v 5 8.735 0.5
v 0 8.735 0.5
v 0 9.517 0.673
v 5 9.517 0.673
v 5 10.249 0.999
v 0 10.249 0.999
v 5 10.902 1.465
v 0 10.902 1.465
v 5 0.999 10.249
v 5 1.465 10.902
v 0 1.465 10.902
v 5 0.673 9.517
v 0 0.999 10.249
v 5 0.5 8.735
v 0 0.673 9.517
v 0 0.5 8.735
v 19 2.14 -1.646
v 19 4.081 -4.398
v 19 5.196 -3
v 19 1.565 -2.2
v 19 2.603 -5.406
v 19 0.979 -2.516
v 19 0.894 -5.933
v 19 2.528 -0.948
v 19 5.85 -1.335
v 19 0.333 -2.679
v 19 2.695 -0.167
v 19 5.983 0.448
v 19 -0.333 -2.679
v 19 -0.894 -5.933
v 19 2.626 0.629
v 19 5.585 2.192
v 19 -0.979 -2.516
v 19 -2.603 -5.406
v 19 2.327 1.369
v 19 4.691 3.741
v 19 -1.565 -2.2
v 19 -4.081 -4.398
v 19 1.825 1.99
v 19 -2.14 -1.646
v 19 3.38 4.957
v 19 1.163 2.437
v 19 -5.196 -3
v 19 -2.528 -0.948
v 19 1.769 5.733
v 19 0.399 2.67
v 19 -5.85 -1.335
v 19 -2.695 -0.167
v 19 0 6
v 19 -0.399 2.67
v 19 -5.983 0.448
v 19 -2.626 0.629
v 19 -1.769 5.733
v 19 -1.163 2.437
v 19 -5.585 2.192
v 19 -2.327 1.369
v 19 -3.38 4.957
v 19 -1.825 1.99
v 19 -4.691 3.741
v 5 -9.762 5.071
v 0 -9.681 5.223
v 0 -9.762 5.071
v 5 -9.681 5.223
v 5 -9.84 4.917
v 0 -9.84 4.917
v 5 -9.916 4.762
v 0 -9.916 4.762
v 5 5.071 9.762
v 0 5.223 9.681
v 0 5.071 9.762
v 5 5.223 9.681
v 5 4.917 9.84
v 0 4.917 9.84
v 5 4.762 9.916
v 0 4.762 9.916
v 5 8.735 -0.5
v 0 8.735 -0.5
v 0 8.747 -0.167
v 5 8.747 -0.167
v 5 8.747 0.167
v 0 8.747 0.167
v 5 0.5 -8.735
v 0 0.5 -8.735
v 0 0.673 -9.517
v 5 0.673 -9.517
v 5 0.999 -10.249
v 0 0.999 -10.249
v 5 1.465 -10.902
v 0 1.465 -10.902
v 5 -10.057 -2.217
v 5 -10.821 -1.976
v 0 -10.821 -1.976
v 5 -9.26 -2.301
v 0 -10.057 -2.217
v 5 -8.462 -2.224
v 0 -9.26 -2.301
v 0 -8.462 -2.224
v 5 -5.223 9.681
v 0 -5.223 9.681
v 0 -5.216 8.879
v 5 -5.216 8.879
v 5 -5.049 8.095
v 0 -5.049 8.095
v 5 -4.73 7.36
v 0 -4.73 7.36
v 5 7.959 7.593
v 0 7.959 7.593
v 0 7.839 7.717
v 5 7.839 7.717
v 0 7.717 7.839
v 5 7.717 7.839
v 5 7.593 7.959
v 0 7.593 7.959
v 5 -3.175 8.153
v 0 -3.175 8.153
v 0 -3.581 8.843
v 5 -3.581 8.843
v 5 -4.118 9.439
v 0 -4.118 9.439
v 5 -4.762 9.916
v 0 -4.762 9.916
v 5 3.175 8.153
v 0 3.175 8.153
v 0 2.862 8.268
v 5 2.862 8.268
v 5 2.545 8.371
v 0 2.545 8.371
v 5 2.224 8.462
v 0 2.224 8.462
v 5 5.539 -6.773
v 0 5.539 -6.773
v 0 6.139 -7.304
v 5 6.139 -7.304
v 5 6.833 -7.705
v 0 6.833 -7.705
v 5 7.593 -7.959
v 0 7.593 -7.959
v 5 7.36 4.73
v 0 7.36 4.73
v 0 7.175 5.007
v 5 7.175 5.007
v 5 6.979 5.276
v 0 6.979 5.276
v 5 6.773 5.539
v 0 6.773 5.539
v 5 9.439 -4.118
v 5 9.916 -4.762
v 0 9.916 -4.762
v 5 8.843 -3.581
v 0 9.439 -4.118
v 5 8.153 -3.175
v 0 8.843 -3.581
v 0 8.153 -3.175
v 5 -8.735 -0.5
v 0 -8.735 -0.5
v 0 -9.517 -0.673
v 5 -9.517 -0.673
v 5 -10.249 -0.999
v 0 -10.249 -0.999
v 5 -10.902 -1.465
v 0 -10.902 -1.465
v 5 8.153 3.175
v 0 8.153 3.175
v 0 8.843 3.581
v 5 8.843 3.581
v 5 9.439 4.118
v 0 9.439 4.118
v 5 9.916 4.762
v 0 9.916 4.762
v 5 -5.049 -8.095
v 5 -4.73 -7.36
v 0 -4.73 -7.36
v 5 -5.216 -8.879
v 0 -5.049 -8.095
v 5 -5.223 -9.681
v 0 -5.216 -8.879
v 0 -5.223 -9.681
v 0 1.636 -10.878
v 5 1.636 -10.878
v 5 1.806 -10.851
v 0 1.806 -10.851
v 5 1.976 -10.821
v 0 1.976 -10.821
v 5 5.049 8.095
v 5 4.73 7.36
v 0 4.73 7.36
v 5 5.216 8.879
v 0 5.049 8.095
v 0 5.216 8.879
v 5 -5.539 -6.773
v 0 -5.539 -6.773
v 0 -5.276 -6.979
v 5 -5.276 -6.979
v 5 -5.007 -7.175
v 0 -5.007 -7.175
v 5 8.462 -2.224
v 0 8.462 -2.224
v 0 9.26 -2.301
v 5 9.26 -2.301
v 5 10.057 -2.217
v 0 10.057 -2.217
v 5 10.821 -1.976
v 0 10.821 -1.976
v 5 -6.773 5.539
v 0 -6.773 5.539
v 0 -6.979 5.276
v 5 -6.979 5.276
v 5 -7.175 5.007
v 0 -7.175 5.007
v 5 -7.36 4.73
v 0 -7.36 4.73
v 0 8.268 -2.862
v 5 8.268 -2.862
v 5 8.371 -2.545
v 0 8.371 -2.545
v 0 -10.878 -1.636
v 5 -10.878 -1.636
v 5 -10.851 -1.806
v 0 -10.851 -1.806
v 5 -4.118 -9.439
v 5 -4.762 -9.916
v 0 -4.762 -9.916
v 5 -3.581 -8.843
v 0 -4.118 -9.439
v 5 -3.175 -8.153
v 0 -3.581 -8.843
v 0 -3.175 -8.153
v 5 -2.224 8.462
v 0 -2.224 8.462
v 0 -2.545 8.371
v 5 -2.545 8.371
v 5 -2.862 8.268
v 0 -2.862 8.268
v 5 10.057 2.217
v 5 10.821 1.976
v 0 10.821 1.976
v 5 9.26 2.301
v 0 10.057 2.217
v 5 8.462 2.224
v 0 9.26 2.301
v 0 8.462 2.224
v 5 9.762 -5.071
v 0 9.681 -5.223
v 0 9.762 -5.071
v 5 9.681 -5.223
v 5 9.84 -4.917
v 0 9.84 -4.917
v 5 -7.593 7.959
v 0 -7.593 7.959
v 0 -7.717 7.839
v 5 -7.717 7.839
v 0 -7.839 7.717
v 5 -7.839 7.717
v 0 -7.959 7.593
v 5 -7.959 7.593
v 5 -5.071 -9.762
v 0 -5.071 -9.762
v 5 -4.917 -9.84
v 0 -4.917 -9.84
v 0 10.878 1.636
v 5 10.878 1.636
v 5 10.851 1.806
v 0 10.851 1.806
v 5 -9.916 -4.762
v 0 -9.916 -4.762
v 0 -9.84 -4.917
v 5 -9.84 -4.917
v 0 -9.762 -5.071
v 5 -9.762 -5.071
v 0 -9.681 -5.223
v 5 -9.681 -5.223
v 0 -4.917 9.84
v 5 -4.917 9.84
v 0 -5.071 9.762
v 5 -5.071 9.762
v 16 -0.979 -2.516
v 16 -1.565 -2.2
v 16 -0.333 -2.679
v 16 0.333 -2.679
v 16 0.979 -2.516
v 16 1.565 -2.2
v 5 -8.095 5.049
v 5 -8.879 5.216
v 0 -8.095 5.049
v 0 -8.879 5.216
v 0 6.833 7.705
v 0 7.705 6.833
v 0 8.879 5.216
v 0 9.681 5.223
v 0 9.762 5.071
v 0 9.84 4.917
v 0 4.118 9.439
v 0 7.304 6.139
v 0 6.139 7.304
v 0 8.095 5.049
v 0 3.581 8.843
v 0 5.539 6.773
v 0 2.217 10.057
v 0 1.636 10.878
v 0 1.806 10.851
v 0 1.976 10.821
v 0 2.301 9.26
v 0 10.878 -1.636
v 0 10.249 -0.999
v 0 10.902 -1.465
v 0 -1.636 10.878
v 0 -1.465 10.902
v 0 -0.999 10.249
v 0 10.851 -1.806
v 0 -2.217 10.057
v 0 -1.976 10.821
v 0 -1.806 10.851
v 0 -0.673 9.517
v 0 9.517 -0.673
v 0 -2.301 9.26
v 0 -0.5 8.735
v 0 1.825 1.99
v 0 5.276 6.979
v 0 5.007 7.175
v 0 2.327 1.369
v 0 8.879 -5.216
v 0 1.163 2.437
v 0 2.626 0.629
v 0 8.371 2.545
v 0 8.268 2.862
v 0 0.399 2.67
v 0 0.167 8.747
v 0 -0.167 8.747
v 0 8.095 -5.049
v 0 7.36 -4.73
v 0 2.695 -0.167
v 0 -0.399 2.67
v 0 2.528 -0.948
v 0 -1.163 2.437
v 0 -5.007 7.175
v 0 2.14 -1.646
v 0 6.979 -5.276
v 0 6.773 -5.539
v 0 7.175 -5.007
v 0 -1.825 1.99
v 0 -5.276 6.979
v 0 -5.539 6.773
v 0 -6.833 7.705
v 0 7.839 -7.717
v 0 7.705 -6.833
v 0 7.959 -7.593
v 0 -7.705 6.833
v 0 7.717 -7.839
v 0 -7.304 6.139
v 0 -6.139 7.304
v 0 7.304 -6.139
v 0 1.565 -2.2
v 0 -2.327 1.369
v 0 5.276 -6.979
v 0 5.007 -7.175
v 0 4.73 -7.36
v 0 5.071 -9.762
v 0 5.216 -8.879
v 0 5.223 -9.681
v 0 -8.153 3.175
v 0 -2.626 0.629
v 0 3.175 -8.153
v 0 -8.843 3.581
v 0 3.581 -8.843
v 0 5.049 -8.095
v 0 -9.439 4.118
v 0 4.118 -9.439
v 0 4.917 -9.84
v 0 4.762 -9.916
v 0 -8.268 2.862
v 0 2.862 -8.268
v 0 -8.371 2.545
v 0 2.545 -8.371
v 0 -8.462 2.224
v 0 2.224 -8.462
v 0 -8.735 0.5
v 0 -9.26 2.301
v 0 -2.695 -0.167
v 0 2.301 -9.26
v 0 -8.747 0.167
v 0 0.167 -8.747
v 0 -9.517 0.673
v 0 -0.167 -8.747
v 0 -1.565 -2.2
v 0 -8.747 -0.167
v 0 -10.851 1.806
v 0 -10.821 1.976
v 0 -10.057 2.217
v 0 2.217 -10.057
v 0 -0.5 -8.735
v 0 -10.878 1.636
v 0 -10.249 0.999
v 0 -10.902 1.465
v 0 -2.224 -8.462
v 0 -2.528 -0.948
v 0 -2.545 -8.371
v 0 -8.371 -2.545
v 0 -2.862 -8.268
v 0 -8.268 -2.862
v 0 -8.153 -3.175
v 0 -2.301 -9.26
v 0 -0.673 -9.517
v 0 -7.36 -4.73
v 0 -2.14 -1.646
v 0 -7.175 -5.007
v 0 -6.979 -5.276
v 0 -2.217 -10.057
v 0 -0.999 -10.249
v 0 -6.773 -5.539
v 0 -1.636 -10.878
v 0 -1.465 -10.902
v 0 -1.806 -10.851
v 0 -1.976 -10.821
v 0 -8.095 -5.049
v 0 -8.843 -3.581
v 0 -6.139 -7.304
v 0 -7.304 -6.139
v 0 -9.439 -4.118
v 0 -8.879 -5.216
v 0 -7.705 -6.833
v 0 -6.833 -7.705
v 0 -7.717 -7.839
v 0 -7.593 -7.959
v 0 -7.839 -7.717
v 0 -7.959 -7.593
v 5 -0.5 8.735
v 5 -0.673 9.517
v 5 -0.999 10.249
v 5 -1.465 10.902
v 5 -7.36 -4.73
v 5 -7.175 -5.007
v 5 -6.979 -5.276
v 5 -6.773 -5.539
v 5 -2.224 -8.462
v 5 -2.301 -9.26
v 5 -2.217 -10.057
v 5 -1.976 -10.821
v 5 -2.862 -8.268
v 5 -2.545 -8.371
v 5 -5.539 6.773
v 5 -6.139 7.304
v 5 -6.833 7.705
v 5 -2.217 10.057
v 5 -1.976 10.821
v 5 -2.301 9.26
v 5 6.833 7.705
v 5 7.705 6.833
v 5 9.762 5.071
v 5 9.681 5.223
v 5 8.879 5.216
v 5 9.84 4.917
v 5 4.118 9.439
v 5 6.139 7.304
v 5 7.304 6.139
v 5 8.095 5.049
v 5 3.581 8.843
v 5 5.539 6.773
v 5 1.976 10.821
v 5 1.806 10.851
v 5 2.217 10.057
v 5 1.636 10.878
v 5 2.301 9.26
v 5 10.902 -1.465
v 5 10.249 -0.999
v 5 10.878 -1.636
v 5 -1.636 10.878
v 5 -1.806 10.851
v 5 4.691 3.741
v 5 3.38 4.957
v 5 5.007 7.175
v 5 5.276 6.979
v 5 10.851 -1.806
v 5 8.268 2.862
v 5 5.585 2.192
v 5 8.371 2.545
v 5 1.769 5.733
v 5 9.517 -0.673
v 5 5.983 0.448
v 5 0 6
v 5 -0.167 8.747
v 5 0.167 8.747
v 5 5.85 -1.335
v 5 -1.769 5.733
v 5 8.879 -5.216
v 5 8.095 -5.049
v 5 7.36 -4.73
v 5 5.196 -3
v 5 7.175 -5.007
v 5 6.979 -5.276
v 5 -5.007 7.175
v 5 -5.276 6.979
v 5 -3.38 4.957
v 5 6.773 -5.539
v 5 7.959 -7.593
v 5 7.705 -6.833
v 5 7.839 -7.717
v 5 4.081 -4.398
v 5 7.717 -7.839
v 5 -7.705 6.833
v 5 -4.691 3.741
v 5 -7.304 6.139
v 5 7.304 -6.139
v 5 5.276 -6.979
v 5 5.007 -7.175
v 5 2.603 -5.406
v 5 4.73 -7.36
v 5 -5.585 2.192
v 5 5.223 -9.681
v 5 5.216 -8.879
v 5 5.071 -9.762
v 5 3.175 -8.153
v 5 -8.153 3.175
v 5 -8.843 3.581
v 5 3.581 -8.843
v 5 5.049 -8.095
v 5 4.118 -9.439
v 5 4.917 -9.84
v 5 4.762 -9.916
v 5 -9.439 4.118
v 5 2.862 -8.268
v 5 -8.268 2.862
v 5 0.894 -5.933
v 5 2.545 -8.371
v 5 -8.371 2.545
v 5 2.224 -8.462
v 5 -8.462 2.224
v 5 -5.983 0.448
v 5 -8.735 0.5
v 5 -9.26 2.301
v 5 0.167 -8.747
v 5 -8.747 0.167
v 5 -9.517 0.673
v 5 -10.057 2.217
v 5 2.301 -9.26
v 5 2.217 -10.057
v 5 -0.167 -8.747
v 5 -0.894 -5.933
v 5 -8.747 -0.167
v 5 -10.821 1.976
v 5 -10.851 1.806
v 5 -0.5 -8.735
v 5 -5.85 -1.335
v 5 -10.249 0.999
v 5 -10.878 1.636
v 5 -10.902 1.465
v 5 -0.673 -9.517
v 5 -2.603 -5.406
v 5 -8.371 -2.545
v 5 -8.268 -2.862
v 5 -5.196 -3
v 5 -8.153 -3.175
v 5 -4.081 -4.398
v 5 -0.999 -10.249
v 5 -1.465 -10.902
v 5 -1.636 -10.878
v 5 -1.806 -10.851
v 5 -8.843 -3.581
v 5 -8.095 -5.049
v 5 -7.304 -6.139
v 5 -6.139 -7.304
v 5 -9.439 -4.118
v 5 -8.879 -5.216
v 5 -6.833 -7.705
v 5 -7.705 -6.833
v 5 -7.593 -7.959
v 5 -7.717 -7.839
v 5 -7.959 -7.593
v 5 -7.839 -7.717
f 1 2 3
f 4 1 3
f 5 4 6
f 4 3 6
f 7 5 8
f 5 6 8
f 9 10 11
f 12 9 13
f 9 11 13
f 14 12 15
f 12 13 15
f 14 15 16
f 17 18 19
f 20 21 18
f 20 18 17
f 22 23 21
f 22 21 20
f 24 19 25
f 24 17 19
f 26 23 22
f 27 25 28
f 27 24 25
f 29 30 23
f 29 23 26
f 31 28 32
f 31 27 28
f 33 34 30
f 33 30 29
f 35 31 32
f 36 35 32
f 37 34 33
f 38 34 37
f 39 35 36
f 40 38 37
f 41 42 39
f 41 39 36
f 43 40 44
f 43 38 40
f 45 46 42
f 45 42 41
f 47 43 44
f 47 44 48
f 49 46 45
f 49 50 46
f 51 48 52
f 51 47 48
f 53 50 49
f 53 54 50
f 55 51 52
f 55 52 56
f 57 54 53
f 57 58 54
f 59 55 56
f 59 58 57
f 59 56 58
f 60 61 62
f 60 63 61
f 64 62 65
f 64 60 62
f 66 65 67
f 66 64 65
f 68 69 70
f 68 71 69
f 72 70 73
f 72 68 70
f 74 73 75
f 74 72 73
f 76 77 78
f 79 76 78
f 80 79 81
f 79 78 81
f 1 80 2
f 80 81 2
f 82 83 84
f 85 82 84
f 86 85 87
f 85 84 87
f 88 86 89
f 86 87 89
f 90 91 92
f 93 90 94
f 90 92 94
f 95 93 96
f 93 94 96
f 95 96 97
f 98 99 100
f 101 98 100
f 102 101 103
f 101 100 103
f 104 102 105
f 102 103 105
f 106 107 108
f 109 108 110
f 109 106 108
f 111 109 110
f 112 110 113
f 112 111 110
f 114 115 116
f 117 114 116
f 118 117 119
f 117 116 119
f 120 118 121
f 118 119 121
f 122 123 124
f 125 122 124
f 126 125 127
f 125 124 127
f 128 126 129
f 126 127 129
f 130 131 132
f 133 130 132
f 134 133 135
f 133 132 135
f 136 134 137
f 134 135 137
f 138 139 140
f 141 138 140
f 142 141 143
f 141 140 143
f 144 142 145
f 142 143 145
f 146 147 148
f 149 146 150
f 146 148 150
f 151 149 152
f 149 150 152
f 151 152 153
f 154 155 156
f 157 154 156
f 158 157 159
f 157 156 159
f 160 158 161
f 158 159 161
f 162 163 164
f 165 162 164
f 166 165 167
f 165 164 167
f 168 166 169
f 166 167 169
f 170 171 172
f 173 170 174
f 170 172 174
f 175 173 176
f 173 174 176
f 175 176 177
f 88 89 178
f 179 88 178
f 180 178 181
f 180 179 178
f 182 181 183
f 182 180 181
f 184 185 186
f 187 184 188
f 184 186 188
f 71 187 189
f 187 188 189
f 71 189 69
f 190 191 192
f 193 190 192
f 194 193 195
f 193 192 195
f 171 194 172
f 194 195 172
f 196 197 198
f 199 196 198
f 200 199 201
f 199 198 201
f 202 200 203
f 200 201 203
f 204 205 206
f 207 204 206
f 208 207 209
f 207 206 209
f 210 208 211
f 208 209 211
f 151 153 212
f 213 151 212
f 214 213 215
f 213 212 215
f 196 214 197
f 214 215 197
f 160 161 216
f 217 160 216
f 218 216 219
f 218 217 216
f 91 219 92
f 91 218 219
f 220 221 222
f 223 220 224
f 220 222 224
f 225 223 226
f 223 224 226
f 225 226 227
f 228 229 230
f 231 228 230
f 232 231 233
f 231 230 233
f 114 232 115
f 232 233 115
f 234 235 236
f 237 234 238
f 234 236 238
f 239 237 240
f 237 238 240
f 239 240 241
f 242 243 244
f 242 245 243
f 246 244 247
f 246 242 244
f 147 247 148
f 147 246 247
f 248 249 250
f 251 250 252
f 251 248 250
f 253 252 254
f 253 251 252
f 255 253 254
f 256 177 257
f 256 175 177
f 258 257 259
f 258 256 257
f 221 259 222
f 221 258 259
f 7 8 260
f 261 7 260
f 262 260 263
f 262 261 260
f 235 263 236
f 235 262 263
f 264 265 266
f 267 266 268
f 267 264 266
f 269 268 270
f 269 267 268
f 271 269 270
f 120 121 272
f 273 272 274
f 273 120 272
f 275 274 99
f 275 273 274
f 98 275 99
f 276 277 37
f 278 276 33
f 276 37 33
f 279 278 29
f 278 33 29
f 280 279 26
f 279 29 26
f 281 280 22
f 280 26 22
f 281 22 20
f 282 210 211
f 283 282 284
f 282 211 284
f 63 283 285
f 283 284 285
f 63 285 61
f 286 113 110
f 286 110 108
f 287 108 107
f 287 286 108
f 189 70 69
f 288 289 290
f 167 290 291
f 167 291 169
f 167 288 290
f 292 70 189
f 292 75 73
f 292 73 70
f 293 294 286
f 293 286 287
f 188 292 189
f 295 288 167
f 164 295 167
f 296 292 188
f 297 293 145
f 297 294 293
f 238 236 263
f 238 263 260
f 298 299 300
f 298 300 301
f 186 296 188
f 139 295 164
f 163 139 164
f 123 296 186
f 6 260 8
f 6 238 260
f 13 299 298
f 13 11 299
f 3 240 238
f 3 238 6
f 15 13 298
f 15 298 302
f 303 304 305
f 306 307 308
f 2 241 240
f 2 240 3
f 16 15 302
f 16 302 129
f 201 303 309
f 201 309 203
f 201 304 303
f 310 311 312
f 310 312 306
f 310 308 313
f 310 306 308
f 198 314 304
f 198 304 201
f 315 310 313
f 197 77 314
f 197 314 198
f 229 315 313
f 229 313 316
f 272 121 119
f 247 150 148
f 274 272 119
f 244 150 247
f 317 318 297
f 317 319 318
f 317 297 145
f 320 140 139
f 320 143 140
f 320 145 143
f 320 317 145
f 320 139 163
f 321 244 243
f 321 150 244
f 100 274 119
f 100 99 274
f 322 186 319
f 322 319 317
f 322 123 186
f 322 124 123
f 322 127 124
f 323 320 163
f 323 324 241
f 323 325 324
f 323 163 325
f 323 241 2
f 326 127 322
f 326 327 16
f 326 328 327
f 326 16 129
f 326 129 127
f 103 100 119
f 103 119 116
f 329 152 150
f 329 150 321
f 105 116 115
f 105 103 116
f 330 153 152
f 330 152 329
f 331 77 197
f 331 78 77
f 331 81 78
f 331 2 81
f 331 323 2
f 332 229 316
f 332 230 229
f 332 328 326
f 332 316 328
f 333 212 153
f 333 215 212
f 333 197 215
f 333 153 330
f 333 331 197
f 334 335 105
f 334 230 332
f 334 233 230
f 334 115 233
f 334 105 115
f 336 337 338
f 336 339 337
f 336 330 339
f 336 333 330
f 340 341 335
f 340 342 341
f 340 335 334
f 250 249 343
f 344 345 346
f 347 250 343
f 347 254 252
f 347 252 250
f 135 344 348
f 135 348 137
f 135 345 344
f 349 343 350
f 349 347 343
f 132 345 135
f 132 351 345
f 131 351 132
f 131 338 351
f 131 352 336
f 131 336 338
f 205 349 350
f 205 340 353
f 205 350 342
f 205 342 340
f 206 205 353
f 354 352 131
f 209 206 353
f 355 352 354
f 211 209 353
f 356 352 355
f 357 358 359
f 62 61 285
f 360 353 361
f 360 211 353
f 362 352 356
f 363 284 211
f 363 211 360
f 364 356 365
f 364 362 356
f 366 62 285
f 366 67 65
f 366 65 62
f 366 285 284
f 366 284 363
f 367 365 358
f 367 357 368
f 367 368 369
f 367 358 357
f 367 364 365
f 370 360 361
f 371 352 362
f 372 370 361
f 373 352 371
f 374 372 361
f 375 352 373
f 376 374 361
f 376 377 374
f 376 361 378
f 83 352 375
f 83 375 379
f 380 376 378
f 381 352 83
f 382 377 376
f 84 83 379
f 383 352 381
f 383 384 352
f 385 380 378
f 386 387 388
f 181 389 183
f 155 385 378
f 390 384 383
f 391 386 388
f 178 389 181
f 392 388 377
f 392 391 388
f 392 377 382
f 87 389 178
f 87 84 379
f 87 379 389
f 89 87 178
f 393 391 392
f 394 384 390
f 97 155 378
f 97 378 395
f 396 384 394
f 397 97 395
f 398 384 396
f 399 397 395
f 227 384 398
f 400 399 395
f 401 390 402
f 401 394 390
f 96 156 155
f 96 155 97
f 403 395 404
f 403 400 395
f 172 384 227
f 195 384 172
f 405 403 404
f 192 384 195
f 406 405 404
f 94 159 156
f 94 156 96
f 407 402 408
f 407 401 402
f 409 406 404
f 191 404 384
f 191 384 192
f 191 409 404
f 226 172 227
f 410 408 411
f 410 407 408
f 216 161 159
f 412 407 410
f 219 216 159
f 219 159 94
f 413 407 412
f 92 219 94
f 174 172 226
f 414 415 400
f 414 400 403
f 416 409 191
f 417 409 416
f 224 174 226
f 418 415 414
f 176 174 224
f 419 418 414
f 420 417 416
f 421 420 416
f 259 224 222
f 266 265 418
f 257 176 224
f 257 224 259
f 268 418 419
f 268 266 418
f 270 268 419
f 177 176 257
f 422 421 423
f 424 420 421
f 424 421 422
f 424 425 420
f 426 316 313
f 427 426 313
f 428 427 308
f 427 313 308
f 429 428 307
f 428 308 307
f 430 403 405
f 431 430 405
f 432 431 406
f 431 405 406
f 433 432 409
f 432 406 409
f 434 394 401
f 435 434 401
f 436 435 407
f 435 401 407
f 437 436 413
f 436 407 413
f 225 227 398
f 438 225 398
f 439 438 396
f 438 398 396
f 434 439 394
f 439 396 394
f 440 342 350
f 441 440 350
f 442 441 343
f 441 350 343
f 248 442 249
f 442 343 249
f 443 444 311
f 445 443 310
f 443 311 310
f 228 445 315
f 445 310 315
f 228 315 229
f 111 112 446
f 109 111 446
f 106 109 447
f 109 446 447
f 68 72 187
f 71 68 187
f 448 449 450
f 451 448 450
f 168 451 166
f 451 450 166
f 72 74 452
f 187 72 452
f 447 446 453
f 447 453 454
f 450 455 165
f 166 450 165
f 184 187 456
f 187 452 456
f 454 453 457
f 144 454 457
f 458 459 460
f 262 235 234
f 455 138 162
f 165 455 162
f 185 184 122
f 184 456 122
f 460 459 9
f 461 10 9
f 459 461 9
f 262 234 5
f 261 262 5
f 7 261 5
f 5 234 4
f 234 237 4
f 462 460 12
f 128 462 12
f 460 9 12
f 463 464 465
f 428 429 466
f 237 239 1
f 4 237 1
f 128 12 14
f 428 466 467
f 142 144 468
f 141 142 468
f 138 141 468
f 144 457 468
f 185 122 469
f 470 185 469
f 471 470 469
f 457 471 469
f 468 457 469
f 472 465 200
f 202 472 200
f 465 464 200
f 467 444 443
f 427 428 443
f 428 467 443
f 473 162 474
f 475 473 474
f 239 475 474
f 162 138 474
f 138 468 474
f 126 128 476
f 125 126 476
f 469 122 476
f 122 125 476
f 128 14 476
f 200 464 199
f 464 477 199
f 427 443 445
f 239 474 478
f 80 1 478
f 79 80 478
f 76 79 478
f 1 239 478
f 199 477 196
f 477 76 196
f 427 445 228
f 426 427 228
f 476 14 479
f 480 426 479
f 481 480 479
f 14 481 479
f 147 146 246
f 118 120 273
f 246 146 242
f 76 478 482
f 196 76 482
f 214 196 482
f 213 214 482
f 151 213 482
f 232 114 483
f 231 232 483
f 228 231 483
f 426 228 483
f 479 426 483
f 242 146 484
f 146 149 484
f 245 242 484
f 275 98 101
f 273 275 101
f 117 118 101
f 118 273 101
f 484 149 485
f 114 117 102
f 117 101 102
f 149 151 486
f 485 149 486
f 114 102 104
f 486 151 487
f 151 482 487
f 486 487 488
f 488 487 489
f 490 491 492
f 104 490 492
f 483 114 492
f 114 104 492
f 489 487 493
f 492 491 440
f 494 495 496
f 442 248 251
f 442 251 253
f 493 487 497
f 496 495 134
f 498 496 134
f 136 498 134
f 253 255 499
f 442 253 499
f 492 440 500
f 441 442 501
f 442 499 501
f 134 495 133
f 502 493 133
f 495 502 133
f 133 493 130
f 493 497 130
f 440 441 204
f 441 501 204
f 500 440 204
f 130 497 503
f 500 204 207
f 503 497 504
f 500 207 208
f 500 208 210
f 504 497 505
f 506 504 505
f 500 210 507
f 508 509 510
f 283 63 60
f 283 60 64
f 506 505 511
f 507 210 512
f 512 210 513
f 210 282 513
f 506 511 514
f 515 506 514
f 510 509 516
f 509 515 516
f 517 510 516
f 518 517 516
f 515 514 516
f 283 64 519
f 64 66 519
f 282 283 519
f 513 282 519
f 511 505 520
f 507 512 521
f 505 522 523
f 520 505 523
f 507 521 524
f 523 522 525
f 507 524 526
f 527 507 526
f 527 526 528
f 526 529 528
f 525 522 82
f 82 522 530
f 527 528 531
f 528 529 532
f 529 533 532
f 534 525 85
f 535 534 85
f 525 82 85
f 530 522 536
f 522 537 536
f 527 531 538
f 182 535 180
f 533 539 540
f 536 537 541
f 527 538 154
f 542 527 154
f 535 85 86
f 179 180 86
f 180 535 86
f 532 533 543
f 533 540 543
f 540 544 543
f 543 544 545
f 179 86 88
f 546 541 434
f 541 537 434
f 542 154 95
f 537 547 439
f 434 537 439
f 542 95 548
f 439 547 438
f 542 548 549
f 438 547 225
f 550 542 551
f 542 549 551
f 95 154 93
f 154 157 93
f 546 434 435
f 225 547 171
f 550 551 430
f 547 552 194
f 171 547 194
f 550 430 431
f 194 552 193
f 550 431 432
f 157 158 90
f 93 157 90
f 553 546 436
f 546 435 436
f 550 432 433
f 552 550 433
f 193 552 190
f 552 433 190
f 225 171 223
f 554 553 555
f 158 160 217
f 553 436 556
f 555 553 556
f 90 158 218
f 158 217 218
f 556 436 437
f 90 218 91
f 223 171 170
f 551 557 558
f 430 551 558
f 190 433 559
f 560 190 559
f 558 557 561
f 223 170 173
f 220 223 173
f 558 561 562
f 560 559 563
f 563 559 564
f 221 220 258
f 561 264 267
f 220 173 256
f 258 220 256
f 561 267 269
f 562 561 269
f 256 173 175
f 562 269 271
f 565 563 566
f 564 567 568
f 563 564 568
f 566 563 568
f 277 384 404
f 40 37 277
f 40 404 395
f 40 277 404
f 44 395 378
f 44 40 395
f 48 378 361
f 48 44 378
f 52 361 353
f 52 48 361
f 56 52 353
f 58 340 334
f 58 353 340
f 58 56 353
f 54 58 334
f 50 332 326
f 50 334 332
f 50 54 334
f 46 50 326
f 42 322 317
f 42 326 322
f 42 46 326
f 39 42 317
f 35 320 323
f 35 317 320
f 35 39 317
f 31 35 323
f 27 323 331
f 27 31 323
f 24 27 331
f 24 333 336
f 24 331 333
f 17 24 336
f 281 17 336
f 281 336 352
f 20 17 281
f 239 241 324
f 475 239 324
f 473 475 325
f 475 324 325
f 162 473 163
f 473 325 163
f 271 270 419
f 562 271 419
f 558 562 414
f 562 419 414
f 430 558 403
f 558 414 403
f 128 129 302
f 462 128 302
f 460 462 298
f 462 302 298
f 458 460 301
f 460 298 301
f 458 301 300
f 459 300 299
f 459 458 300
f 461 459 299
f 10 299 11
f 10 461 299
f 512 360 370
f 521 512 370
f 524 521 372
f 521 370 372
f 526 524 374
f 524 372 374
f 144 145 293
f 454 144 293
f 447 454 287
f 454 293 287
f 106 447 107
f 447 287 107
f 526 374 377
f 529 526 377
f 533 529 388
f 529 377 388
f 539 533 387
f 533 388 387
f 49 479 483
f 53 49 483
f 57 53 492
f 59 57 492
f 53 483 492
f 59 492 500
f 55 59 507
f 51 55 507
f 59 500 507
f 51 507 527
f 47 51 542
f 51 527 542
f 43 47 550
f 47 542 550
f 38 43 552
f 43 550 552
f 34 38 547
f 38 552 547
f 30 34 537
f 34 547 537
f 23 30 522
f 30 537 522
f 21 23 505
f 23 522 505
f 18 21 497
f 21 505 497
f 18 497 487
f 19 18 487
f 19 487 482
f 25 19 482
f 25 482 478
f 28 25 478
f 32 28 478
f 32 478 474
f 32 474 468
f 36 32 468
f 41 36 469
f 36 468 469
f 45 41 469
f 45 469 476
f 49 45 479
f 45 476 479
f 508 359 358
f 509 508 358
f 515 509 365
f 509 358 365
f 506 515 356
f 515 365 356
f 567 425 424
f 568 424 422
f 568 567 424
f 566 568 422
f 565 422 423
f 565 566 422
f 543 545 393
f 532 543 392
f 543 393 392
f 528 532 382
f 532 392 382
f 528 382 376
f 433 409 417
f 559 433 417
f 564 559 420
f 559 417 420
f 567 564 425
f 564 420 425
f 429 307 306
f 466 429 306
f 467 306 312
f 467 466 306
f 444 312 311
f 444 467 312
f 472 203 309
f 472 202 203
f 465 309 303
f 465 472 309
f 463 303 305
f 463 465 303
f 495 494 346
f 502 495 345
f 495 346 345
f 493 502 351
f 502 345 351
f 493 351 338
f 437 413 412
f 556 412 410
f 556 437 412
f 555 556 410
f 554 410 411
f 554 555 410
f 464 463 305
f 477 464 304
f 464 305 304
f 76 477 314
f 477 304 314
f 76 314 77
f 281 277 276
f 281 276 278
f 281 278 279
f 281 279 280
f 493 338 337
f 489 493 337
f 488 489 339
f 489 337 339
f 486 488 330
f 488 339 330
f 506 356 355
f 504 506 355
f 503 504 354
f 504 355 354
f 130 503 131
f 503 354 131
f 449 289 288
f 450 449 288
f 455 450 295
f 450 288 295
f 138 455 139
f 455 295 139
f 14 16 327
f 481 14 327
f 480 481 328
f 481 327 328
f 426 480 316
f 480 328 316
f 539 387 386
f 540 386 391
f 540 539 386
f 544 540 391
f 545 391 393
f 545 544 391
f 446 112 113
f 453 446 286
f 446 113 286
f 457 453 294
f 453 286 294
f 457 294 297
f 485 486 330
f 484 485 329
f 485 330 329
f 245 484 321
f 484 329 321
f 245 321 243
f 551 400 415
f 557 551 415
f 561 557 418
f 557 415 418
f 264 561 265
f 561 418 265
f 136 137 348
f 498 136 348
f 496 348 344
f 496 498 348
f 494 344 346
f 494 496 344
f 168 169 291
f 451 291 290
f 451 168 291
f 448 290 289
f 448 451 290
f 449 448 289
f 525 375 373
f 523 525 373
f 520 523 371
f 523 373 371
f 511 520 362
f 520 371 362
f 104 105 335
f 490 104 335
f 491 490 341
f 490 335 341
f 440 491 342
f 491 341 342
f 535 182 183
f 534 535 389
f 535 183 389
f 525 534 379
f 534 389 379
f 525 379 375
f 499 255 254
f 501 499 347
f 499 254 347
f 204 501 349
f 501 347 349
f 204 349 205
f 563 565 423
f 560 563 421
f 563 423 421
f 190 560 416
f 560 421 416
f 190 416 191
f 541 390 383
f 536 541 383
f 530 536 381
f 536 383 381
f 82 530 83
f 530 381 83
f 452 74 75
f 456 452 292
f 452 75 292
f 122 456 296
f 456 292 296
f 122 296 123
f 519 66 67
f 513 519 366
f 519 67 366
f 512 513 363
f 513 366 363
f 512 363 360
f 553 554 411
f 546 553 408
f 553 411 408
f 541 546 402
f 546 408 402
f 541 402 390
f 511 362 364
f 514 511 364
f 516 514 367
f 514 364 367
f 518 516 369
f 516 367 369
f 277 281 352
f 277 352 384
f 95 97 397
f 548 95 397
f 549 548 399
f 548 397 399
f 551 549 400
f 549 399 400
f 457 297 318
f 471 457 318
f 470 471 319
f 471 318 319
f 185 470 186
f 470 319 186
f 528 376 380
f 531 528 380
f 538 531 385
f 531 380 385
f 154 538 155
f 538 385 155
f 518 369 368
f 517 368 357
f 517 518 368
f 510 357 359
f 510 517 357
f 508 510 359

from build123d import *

# Parameters (mm, degrees)
BASPROSKE_W         = 5
BASPROSKE_H         = 11
TOOTHCUT_DEPTH      = 17.340134638
TEETHCUTS_COUNT     = 20
BORSKE_R            = 1.5
BORE_DEPTH          = 50.0000508
SKETCH_1_R          = 6
EXTRUDE_1_DEPTH     = 14
CUT_EXTRUDE_1_DEPTH = 25.468506397
SKETCH_3_R          = 2.7
CUT_EXTRUDE_2_DEPTH = 3


with BuildPart() as part:
    # BasProSke → Base-Revolve (revolve)
    with BuildSketch(Plane(origin=(0, 0, 0), x_dir=(1, 0, 0), z_dir=(0, 1, 0)), mode=Mode.PRIVATE) as base_revolve_sk:
        with Locations((2.5, 5.5)):
            Rectangle(BASPROSKE_W, BASPROSKE_H)
    revolve(base_revolve_sk.sketch.rotate(Axis((-10, 0, 0), (1, 0, 0)), 180), axis=Axis((-10, 0, 0), (1, 0, 0)))

    # TooCutSke → ToothCut (cut, through all)
    with BuildSketch(Plane(origin=(0, 0, 0), x_dir=(0, 0, -1), z_dir=(1, 0, 0))):
        with BuildLine():
            ThreePointArc((0.499924007, 8.734705318), (0, 8.749), (-0.499924007, 8.734705318))
            ThreePointArc((-0.499924007, 8.734705318), (-0.824302243, 9.905497836), (-1.485192705, 10.924909509))
            ThreePointArc((-1.485192705, 10.924909509), (0, 11.0254), (1.485192705, 10.924909509))
            ThreePointArc((1.485192705, 10.924909509), (0.824302243, 9.905497836), (0.499924007, 8.734705318))
        make_face()
    toothcut = extrude(amount=TOOTHCUT_DEPTH, mode=Mode.SUBTRACT)

    # TeethCuts: ToothCut ×20 about axis
    teethcuts_axis = Axis((0, 0, 0), (1, 0, 0))
    for i in range(1, TEETHCUTS_COUNT):
        add(toothcut.rotate(teethcuts_axis, i * 360 / TEETHCUTS_COUNT), mode=Mode.SUBTRACT)

    # BorSke → Bore (cut, symmetric)
    with BuildSketch(Plane(origin=(0, 0, 0), x_dir=(0, 0, -1), z_dir=(1, 0, 0))):
        with Locations(Location((0, 0, 0), (0, 0, 180))):
            Circle(BORSKE_R)
    extrude(amount=BORE_DEPTH, both=True, mode=Mode.SUBTRACT)

    # 草图1 → 凸台-拉伸1 (add)
    with BuildSketch(Plane(origin=(5, 0, 0), x_dir=(0, 0, -1), z_dir=(1, 0, 0))):
        with Locations(Location((0, 0, 0), (0, 0, 180))):
            Circle(SKETCH_1_R)
    extrude(amount=EXTRUDE_1_DEPTH)

    # 草图2 → 切除-拉伸1 (cut, through all)
    with BuildSketch(Plane(origin=(19, 0, 0), x_dir=(0, 0, -1), z_dir=(1, 0, 0))):
        with BuildLine():
            Line((2.2, 1.565247584), (2.2, -1.565247584))
            ThreePointArc((2.2, -1.565247584), (-2.7, 0), (2.2, 1.565247584))
        make_face()
    extrude(amount=-CUT_EXTRUDE_1_DEPTH, mode=Mode.SUBTRACT)

    # 草图3 → 切除-拉伸2 (cut)
    with BuildSketch(Plane(origin=(19, 0, 0), x_dir=(0, 0, -1), z_dir=(1, 0, 0))):
        Circle(SKETCH_3_R)
    extrude(amount=-CUT_EXTRUDE_2_DEPTH, mode=Mode.SUBTRACT)


solid = part.part
